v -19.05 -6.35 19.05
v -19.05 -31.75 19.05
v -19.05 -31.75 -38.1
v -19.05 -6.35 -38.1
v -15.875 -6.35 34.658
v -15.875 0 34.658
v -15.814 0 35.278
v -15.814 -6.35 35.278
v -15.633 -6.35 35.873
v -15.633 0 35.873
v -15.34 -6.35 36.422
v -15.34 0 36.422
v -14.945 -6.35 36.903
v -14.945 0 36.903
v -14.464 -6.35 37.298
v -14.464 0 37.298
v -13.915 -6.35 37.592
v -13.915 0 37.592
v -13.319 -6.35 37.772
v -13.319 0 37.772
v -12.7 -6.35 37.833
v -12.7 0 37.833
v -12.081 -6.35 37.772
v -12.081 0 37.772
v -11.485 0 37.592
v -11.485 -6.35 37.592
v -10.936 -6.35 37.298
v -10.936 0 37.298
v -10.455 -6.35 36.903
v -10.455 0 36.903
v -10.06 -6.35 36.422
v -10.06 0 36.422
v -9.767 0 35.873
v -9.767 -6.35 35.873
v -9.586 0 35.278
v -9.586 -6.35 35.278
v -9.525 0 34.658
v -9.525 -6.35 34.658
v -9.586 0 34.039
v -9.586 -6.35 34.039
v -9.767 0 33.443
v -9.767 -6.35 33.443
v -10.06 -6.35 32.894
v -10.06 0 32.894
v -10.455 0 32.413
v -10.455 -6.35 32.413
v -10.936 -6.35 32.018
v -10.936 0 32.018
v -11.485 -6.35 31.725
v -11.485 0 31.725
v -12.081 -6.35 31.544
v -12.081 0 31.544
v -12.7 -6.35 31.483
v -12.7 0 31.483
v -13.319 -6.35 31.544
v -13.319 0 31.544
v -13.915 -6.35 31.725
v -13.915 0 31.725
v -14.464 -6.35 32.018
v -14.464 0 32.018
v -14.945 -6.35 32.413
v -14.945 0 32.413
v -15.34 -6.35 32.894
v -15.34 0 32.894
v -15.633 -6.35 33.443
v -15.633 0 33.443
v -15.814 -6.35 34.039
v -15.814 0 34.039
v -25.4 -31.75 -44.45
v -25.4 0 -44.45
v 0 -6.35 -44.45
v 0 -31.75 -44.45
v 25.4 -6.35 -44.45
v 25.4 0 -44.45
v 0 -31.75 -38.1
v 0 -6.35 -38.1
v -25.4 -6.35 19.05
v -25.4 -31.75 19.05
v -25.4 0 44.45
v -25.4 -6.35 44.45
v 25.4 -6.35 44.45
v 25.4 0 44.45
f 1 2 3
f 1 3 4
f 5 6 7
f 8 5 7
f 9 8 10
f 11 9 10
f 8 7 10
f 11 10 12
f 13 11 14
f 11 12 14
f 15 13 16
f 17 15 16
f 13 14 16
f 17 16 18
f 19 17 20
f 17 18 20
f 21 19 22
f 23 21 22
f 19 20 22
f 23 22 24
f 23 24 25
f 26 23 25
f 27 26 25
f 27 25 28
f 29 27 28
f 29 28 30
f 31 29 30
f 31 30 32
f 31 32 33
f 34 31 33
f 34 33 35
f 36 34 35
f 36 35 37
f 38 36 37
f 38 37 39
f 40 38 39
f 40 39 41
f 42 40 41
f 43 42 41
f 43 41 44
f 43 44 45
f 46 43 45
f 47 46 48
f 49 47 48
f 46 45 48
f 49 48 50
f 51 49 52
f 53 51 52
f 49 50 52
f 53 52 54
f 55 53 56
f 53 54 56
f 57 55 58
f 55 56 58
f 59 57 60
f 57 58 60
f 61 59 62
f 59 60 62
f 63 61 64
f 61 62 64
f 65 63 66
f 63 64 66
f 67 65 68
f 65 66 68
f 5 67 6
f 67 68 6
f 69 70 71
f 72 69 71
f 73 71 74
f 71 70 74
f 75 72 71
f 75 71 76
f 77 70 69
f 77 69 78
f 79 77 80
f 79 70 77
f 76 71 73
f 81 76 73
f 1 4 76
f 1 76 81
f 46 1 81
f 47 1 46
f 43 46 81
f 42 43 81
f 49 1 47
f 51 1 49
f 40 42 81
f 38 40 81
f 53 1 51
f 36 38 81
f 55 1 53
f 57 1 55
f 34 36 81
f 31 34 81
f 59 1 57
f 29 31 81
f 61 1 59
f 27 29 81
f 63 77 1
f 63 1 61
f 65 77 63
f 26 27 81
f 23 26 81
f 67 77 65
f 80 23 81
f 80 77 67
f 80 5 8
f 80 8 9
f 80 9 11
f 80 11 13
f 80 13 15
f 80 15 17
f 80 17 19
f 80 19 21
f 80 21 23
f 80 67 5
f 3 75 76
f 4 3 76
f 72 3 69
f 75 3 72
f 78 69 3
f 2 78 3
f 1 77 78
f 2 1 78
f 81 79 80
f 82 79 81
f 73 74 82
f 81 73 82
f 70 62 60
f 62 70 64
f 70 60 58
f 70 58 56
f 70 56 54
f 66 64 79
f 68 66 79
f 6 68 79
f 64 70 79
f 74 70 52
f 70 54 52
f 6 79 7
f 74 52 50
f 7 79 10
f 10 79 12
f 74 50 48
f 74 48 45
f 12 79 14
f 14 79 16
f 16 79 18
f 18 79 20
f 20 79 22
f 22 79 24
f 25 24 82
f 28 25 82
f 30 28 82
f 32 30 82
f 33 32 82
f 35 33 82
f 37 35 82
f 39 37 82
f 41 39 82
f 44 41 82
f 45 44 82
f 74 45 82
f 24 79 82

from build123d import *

# Parameters (mm, degrees)
F0_W     = 50.8
F0_H     = 88.9
F1_DEPTH = 31.75
F2_W     = 25.4
F2_H     = 82.55
F3_DEPTH = 44.45
F4_W     = 25.4
F4_H     = 25.4
F5_DEPTH = 25.4
F6_W     = 25.4
F6_H     = 6.35
F7_DEPTH = 25.4
F8_R     = 3.175
F9_DEPTH = 25.4


with BuildPart() as f1:
    # F0 (on Front) → F1 (new body)
    with BuildSketch(Plane.XZ):
        Rectangle(F0_W, F0_H)
    extrude(amount=F1_DEPTH)

    # F2 (on face) → F3 (cut)
    with BuildSketch(Plane.YZ.offset(25.4)):
        with Locations((-19.05, 3.175)):
            Rectangle(F2_W, F2_H)
    extrude(amount=-F3_DEPTH, mode=Mode.SUBTRACT)

    # F4 (on face) → F5 (cut)
    with BuildSketch(Plane(origin=(-25.4, 0, 0), x_dir=(0, -1, 0), z_dir=(-1, 0, 0))):
        with Locations((19.05, 31.75)):
            Rectangle(F4_W, F4_H)
    extrude(amount=-F5_DEPTH, mode=Mode.SUBTRACT)

    # F6 (on face) → F7 (cut)
    with BuildSketch(Plane.XZ.offset(31.75)):
        with Locations((12.7, -41.275)):
            Rectangle(F6_W, F6_H)
    extrude(amount=-F7_DEPTH, mode=Mode.SUBTRACT)

    # F8 (on face) → F9 (cut)
    with BuildSketch(Plane(origin=(0, 0, 0), x_dir=(-1, 0, 0), z_dir=(0, 1, 0))):
        with Locations((12.7, 34.658268)):
            Circle(F8_R)
    extrude(amount=-F9_DEPTH, mode=Mode.SUBTRACT)


solid = f1.part
